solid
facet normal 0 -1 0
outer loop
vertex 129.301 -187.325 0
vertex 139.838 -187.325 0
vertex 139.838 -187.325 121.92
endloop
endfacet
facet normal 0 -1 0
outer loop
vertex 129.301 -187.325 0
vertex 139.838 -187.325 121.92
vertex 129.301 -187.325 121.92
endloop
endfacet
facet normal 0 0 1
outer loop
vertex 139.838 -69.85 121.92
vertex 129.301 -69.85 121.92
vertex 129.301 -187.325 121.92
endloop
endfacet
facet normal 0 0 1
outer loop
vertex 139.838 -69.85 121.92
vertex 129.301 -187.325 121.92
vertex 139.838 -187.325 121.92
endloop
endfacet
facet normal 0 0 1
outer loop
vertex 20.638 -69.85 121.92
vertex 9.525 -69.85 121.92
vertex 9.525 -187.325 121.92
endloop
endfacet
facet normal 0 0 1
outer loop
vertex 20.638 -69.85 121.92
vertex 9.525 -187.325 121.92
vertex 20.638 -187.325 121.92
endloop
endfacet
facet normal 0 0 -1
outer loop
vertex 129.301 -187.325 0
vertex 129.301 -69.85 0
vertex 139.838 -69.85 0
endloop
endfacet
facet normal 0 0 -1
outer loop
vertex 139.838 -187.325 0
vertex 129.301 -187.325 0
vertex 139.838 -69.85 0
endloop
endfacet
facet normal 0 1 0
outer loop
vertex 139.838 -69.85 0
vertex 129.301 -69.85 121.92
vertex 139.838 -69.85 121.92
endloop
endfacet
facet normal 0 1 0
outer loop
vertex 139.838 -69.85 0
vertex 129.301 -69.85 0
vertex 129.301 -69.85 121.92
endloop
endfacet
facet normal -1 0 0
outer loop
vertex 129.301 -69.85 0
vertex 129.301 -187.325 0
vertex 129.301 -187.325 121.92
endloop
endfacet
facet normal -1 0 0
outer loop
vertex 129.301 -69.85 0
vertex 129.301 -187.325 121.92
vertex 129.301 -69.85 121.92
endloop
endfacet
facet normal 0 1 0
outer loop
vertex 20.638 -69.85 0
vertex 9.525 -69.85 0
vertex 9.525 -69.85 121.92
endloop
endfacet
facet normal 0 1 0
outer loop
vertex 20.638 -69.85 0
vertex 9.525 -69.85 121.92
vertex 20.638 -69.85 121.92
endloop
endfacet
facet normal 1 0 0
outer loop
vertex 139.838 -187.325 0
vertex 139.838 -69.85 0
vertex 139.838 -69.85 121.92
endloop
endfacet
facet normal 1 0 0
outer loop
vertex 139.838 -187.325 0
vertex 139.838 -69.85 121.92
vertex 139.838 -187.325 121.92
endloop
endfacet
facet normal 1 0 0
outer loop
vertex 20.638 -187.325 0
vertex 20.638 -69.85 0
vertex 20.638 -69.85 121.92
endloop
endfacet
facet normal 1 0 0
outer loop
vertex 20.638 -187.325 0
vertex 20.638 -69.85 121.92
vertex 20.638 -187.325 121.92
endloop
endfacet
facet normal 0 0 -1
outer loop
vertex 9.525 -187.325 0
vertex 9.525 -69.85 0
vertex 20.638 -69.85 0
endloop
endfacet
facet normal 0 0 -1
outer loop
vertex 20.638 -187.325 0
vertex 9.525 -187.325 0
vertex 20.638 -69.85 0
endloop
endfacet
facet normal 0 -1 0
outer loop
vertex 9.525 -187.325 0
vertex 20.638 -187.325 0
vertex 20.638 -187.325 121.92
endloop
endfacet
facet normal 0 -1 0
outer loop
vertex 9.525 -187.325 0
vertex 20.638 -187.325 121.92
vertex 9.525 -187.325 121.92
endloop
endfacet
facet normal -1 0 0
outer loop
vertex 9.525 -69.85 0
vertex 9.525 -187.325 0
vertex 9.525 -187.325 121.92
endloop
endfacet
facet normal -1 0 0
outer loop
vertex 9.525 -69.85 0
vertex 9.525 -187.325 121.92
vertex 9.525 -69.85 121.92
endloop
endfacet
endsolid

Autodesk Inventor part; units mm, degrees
ref_plane "YZ Plane" through (0, 0, 0) normal (1, 0, 0) x (0, 1, 0)
ref_plane "XZ Plane" through (0, 0, 0) normal (0, 1, 0) x (-1, 0, 0)
ref_plane "XY Plane" through (0, 0, 0) normal (0, 0, 1) x (1, 0, 0)
ref_plane "Work Plane1" through (0, 0, 0) normal (0, 0, 1) x (1, 0, 0)
sketch "Sketch1" plane through (0, 0, 0) normal (0, 0, 1) x (1, 0, 0)
  line L0 (139.8381, -187.325) -> (129.3008, -187.325)
  line L1 (129.3008, -187.325) -> (129.3008, -69.85)
  line L2 (129.3008, -69.85) -> (139.8381, -69.85)
  line L3 (139.8381, -69.85) -> (139.8381, -187.325)
  line L4 (20.6375, -187.325) -> (9.525, -187.325)
  line L5 (9.525, -187.325) -> (9.525, -69.85)
  line L6 (9.525, -69.85) -> (20.6375, -69.85)
  line L7 (20.6375, -69.85) -> (20.6375, -187.325)
  point P0 (0, 0)
extrude "Extrusion1" add sketch "Sketch1" along normal blind 121.92
properties part number "conveyor stand"
